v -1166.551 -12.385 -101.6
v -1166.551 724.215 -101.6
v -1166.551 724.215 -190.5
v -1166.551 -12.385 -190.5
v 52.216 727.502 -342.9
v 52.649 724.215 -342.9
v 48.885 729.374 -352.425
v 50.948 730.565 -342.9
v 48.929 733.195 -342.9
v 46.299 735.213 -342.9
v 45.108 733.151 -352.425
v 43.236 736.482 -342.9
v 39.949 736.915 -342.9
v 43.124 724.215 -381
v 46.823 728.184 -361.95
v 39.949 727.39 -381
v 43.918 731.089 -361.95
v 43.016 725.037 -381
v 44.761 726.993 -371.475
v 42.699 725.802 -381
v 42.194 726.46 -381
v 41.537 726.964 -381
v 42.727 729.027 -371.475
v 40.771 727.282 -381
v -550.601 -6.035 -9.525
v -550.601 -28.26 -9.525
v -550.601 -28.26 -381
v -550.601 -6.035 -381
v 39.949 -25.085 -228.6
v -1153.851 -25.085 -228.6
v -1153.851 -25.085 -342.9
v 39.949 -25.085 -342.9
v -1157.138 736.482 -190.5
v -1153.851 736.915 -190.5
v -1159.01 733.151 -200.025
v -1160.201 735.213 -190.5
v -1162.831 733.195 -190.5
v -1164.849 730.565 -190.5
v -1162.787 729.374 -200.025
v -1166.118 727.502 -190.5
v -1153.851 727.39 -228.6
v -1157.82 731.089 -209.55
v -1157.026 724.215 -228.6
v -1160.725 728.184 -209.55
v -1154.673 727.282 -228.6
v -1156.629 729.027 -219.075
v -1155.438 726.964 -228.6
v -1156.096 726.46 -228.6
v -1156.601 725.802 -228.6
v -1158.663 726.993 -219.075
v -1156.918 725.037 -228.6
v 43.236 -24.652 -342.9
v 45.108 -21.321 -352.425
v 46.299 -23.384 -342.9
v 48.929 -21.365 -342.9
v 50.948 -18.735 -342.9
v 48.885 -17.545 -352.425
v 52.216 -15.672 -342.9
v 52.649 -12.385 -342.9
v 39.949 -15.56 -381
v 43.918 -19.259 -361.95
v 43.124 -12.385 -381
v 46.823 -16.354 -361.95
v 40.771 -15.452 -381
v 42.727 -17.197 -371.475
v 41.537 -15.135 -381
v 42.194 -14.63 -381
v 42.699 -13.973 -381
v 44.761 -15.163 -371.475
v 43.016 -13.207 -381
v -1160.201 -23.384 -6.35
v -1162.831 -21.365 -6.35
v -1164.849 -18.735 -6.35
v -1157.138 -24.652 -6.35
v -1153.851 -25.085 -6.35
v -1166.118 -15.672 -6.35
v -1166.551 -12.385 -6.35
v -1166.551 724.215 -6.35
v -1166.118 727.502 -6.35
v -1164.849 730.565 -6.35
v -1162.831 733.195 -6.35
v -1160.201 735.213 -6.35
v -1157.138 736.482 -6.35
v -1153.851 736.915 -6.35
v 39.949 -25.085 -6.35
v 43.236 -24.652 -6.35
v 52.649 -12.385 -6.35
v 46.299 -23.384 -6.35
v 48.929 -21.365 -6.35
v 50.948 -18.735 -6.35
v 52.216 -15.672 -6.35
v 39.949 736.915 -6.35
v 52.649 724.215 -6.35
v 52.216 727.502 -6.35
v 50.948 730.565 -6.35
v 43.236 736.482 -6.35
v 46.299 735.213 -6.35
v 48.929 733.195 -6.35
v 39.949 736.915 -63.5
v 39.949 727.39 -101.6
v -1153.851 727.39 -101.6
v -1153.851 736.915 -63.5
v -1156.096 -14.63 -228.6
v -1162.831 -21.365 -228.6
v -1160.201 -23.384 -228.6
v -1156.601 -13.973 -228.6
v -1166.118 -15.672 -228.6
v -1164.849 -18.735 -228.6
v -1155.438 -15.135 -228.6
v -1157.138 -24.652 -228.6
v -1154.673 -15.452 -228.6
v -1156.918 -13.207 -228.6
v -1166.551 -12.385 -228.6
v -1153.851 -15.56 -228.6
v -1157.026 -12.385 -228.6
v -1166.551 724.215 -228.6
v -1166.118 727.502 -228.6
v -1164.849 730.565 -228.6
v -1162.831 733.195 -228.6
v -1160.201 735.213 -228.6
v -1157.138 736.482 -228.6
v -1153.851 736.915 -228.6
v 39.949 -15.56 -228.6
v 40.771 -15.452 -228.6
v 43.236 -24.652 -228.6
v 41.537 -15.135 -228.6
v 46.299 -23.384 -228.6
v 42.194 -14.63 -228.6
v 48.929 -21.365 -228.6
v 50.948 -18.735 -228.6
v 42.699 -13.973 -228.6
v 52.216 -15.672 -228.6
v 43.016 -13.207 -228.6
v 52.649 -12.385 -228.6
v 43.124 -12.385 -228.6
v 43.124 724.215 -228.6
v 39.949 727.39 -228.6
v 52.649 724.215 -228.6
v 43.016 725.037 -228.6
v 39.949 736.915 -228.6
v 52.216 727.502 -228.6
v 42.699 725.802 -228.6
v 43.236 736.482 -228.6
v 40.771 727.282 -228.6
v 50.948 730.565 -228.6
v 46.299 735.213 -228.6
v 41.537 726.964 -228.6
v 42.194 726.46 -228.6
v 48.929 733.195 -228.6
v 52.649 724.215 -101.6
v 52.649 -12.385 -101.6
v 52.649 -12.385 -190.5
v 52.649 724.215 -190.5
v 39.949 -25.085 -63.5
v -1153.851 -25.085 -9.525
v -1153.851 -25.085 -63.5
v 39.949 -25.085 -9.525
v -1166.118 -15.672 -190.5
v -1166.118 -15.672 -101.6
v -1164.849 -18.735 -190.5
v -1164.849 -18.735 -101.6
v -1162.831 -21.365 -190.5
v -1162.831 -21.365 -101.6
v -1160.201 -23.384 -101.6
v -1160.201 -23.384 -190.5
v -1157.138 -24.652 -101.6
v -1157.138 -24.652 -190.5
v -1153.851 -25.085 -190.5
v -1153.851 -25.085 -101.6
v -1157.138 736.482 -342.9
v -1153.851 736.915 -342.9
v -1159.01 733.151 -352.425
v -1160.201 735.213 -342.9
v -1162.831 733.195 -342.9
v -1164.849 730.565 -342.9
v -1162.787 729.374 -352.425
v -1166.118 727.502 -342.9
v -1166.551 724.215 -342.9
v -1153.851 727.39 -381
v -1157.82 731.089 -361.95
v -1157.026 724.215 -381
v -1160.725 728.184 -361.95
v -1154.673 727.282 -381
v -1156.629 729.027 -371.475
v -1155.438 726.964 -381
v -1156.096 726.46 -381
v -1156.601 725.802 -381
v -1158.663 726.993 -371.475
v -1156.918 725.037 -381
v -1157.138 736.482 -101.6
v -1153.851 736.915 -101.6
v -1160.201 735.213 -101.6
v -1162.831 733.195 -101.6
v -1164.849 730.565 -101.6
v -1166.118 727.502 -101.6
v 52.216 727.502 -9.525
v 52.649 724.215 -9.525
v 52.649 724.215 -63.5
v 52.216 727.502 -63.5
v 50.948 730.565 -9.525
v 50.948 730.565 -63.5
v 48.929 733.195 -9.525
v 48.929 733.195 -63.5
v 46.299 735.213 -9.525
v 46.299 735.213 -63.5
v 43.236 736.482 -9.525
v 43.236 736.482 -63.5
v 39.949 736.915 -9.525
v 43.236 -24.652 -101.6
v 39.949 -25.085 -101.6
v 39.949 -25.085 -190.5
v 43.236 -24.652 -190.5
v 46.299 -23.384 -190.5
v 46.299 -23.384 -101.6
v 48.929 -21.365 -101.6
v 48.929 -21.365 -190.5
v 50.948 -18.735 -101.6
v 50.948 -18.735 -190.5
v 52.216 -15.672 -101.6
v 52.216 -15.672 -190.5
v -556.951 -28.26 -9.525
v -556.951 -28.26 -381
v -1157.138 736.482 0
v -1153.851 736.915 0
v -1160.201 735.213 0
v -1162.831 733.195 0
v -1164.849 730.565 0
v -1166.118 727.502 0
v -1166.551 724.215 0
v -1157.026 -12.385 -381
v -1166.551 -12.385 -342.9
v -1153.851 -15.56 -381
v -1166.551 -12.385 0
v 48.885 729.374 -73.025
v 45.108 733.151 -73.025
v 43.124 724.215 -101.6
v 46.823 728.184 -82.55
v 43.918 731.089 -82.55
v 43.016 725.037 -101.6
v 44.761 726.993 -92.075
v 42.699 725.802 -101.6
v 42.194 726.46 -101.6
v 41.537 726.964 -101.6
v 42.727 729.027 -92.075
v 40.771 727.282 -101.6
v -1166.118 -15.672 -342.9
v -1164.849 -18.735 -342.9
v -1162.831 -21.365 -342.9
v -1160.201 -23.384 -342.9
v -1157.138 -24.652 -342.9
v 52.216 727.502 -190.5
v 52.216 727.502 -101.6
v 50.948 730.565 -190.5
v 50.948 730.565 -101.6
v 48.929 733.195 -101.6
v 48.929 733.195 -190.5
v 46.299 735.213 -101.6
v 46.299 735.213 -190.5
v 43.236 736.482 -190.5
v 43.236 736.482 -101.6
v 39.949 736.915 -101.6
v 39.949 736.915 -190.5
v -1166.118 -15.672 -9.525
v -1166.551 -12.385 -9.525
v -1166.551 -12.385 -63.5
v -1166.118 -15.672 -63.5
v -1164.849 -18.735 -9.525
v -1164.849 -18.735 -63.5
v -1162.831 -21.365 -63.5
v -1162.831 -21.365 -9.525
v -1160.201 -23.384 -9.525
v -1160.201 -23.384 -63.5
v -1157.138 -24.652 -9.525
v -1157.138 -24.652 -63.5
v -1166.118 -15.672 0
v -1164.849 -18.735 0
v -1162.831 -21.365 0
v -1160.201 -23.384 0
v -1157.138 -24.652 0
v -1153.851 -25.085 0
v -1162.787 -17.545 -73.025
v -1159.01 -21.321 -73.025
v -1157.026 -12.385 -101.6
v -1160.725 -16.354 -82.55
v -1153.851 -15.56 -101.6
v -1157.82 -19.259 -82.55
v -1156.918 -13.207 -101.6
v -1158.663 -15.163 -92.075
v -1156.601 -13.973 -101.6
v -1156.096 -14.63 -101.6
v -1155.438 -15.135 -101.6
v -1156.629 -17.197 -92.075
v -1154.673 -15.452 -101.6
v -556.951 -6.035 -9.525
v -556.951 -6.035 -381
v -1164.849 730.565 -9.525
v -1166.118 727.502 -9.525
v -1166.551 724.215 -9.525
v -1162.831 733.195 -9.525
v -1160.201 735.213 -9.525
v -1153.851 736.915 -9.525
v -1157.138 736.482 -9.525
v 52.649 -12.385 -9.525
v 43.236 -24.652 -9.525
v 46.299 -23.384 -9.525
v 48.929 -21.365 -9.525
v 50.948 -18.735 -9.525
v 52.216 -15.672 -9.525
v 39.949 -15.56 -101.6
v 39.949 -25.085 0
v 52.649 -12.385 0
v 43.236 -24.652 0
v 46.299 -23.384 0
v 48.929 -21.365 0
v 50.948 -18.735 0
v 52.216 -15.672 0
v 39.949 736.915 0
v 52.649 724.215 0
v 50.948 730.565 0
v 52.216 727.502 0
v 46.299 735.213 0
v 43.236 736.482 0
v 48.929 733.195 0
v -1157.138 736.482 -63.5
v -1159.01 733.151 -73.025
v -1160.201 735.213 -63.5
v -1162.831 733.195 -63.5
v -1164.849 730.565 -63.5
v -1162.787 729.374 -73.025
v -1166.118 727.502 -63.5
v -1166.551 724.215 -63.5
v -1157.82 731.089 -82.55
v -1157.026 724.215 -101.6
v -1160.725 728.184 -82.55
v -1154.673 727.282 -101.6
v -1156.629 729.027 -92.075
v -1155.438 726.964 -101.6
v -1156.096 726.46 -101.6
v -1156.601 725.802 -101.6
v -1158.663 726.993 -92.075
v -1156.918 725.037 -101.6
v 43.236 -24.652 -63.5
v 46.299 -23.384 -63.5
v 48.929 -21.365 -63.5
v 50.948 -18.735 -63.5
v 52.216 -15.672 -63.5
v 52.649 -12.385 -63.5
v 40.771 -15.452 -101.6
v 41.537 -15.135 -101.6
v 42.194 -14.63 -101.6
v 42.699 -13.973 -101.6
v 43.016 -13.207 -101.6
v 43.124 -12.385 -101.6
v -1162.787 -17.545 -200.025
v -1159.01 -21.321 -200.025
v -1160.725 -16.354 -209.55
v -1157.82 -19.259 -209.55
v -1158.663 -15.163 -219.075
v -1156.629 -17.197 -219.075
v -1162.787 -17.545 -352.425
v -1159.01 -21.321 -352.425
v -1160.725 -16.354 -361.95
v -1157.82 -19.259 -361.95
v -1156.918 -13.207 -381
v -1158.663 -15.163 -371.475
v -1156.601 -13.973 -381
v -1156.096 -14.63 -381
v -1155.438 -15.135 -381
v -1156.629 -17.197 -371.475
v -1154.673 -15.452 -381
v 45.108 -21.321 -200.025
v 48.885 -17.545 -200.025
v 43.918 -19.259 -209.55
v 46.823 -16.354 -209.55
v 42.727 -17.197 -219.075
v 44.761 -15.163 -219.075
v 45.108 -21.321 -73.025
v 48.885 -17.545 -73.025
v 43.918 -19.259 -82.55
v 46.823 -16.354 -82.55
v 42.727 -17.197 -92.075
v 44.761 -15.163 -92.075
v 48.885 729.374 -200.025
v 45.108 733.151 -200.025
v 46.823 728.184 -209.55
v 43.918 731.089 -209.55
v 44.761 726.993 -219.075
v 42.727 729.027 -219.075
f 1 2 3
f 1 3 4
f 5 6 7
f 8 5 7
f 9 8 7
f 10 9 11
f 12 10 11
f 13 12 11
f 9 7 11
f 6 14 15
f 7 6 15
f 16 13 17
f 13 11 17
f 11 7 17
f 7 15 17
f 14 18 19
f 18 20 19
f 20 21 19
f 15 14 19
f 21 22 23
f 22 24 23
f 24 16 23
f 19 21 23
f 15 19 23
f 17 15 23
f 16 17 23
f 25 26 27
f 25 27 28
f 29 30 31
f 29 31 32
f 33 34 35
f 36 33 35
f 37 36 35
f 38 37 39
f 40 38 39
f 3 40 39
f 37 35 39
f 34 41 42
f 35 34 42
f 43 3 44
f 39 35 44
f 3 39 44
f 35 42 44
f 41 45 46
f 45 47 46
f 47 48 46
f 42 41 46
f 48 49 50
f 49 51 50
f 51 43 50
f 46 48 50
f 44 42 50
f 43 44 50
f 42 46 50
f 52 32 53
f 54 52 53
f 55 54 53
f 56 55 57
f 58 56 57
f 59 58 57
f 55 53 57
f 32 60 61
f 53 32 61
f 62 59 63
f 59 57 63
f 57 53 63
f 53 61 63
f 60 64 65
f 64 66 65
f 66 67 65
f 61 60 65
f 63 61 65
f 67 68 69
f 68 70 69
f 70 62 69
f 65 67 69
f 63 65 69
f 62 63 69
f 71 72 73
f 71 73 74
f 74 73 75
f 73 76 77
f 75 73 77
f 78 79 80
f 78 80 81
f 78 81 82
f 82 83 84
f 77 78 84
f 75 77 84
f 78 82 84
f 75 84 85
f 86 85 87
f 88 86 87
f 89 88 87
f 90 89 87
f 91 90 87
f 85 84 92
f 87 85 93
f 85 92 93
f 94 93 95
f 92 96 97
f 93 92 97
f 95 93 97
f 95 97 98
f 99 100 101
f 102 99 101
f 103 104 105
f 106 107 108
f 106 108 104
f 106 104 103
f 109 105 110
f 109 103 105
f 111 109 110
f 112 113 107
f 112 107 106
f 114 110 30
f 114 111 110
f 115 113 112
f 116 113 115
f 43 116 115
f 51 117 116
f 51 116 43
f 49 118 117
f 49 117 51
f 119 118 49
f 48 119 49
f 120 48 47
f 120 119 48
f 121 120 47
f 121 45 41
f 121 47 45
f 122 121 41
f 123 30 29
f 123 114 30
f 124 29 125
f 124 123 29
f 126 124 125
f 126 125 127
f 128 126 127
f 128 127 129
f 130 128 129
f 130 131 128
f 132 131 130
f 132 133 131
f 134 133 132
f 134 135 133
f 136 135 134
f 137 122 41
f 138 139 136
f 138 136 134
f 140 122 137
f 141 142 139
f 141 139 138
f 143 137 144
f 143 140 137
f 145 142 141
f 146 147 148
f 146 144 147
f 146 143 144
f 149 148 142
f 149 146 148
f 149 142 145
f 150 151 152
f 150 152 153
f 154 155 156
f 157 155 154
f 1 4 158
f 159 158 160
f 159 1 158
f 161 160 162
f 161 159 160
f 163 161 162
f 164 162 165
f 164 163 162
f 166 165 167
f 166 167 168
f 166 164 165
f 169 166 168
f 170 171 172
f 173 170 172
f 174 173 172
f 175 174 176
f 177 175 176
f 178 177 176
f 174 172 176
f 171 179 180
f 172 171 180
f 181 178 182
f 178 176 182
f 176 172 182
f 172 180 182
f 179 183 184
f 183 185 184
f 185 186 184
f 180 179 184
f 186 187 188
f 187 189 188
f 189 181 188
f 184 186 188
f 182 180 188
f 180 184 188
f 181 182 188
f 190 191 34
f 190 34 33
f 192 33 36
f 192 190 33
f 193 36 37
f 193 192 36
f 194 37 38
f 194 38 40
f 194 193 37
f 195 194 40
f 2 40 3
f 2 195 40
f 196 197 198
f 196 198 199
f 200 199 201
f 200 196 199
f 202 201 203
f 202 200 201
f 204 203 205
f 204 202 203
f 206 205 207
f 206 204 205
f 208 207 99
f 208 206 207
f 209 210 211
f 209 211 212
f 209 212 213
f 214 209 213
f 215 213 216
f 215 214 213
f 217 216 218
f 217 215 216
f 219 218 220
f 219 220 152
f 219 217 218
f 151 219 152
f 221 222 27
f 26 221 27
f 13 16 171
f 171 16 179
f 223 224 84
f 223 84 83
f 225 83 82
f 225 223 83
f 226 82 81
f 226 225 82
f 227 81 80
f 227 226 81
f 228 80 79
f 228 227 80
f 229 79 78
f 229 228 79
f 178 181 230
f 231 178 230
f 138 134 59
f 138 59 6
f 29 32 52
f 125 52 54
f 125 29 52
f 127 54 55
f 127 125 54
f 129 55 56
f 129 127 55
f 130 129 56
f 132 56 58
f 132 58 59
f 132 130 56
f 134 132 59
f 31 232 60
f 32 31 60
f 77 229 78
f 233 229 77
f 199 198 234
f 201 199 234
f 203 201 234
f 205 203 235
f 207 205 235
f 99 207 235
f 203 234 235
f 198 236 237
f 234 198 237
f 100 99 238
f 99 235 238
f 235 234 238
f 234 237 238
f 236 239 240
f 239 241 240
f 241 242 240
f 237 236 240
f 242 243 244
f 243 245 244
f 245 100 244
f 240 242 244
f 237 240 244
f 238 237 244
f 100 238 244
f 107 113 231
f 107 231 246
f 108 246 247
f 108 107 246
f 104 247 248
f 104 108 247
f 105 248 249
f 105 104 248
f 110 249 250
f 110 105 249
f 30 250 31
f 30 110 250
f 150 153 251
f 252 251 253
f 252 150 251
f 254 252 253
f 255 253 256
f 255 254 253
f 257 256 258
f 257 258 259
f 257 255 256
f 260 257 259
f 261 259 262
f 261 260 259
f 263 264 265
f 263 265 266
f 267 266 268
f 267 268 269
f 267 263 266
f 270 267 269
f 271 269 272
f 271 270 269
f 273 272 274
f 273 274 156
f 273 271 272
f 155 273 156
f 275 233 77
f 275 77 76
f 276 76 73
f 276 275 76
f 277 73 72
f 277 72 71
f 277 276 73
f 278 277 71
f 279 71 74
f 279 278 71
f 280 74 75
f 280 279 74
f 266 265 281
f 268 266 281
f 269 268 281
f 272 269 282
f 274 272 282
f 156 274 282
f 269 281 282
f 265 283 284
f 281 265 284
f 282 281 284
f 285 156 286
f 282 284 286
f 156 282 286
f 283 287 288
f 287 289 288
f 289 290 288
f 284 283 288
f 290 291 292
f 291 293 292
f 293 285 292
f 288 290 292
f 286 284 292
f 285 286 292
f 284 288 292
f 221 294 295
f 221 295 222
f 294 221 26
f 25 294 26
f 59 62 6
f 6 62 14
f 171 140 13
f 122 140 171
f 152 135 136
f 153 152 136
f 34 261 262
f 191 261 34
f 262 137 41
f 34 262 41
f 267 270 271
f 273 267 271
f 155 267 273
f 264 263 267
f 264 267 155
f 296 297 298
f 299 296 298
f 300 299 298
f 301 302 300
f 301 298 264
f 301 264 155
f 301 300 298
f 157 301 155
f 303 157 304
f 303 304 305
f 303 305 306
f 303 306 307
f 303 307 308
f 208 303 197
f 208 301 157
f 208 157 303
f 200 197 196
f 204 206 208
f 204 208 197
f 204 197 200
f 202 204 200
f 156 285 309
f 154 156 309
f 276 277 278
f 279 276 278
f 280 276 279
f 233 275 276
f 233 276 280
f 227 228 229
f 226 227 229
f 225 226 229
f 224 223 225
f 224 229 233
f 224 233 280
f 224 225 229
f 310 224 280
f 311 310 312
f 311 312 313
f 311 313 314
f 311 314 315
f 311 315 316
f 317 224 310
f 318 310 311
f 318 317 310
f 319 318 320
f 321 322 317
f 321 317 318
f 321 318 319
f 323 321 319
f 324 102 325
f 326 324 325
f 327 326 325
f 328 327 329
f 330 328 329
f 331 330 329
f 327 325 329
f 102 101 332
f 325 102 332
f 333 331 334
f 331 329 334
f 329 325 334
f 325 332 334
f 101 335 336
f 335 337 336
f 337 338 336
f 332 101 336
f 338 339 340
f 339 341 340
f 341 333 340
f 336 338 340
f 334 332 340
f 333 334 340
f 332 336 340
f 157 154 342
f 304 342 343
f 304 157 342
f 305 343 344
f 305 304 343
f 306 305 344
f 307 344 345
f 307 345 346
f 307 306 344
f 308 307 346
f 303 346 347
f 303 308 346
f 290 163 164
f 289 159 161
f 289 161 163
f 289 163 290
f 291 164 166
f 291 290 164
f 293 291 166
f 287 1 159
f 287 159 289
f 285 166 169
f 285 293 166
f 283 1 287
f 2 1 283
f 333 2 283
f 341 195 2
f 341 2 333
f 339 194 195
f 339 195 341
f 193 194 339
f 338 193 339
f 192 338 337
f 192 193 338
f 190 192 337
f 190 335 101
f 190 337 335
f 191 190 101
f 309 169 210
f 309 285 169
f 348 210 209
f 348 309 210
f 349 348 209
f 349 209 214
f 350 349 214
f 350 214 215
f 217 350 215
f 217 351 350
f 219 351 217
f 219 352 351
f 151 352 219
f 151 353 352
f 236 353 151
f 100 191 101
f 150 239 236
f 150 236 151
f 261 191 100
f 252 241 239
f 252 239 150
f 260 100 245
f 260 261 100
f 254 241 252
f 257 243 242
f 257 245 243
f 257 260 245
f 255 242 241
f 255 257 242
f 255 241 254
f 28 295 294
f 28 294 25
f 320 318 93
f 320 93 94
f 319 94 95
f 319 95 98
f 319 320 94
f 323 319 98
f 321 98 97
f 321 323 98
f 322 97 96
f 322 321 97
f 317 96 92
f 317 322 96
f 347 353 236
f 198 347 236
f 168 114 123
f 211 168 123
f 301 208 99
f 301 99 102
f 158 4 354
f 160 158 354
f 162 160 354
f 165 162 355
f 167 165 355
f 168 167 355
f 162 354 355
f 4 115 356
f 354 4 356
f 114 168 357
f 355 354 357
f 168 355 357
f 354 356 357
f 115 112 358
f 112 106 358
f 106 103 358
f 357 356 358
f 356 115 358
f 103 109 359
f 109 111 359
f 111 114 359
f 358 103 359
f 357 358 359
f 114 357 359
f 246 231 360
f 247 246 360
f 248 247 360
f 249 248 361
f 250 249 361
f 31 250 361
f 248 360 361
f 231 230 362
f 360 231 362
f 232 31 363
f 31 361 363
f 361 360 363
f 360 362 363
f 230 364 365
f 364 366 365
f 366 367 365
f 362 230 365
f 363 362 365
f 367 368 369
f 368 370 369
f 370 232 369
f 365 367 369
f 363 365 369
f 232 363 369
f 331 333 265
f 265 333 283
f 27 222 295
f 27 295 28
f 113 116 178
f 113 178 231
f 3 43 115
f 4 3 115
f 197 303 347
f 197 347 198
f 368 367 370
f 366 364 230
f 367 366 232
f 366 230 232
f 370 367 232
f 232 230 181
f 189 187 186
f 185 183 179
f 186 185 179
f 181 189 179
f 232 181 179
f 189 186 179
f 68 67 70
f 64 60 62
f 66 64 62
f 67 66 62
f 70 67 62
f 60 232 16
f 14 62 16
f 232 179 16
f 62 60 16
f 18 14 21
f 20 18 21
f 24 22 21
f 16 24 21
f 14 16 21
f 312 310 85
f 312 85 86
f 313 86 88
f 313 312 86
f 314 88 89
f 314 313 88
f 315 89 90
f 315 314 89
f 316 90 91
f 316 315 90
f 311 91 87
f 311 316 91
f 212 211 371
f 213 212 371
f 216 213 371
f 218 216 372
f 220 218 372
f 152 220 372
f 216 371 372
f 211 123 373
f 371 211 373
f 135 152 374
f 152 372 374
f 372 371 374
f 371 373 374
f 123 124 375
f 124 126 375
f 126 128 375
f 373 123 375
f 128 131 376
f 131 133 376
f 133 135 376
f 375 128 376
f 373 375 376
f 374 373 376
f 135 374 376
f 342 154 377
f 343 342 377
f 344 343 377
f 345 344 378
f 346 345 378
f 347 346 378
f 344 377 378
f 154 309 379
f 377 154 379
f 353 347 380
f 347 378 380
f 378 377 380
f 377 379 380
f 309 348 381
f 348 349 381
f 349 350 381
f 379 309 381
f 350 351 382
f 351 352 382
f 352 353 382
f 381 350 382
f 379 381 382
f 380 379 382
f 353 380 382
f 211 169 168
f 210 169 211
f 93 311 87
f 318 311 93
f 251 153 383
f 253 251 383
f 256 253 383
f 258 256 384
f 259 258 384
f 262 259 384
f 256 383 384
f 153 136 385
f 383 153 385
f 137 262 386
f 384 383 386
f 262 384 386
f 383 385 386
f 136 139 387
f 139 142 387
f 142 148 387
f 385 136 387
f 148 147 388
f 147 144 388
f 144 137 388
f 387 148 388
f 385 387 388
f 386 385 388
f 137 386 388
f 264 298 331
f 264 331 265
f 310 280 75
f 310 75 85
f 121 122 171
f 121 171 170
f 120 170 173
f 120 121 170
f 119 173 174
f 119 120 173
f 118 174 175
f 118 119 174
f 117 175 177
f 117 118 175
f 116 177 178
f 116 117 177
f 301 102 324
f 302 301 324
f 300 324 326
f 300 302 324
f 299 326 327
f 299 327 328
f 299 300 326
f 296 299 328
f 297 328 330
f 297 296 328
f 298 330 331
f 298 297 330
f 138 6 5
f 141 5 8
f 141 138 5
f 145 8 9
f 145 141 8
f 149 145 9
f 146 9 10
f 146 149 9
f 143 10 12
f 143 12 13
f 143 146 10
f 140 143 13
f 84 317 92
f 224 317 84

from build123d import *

# Parameters (mm, degrees)
F1_DEPTH = 6.35
F2_START = -9.525
F2_DEPTH = 92.075
F3_SIZE2 = 9.525
F3_SIZE  = 38.1
F4_START = -101.6
F4_DEPTH = 127
F5_SIZE2 = 9.525
F5_SIZE  = 38.1
F6_START = -228.6
F6_DEPTH = 152.4
F7_SIZE2 = 9.525
F7_SIZE  = 38.1
F9_START = -9.525
F8_W     = 6.35
F8_H     = 3.175
F8_H_2   = 19.05
F9_DEPTH = 371.475


# Not quite as in the source:
# - a feature names something its author has since deleted; it is built from what else it names


with BuildPart() as f1:
    # F0 (on Top) → F1 (new body)
    with BuildSketch(Plane.XY):
        with BuildLine():
            Line((39.9490956545, 736.9148339033), (-1153.8509043455, 736.9148339033))
            ThreePointArc((-1153.8509043455, 736.9148339033), (-1162.8311604666, 733.1950900244), (-1166.5509043455, 724.2148339033))
            Line((-1166.5509043455, 724.2148339033), (-1166.5509043455, 40.0023339033))
            Line((-1166.5509043455, 40.0023339033), (-1166.5509043455, 38.4148339033))
            Line((-1166.5509043455, 38.4148339033), (-1147.5009043455, 38.4148339033))
            Line((-1147.5009043455, 38.4148339033), (-1103.0509043455, 38.4148339033))
            Line((-1103.0509043455, 38.4148339033), (-1103.0509043455, -6.0351660967))
            Line((-1103.0509043455, -6.0351660967), (-1103.0509043455, -25.0851660967))
            Line((-1103.0509043455, -25.0851660967), (-1101.4634043455, -25.0851660967))
            Line((-1101.4634043455, -25.0851660967), (-560.1259043455, -25.0851660967))
            Line((-560.1259043455, -25.0851660967), (-553.7759043455, -25.0851660967))
            Line((-553.7759043455, -25.0851660967), (39.9490956545, -25.0851660967))
            ThreePointArc((39.9490956545, -25.0851660967), (48.9293517756, -21.3654222178), (52.6490956545, -12.3851660967))
            Line((52.6490956545, -12.3851660967), (52.6490956545, 724.2148339033))
            ThreePointArc((52.6490956545, 724.2148339033), (48.9293517756, 733.1950900244), (39.9490956545, 736.9148339033))
        make_face()
        with BuildLine():
            Line((-1147.5009043455, 38.4148339033), (-1166.5509043455, 38.4148339033))
            Line((-1166.5509043455, 38.4148339033), (-1166.5509043455, -12.3851660967))
            ThreePointArc((-1166.5509043455, -12.3851660967), (-1162.8311604666, -21.3654222178), (-1153.8509043455, -25.0851660967))
            Line((-1153.8509043455, -25.0851660967), (-1103.0509043455, -25.0851660967))
            Line((-1103.0509043455, -25.0851660967), (-1103.0509043455, -6.0351660967))
            Line((-1103.0509043455, -6.0351660967), (-1103.0509043455, 38.4148339033))
            Line((-1103.0509043455, 38.4148339033), (-1147.5009043455, 38.4148339033))
        make_face()
    extrude(amount=-F1_DEPTH)


with BuildPart() as f2:
    # F0 (on Top) → F2 (new body)
    with BuildSketch(Plane.XY.offset(F2_START)):
        with BuildLine():
            Line((39.9490956545, 736.9148339033), (-1153.8509043455, 736.9148339033))
            ThreePointArc((-1153.8509043455, 736.9148339033), (-1162.8311604666, 733.1950900244), (-1166.5509043455, 724.2148339033))
            Line((-1166.5509043455, 724.2148339033), (-1166.5509043455, 40.0023339033))
            Line((-1166.5509043455, 40.0023339033), (-1166.5509043455, 38.4148339033))
            Line((-1166.5509043455, 38.4148339033), (-1147.5009043455, 38.4148339033))
            Line((-1147.5009043455, 38.4148339033), (-1103.0509043455, 38.4148339033))
            Line((-1103.0509043455, 38.4148339033), (-1103.0509043455, -6.0351660967))
            Line((-1103.0509043455, -6.0351660967), (-1103.0509043455, -25.0851660967))
            Line((-1103.0509043455, -25.0851660967), (-1101.4634043455, -25.0851660967))
            Line((-1101.4634043455, -25.0851660967), (-560.1259043455, -25.0851660967))
            Line((-560.1259043455, -25.0851660967), (-553.7759043455, -25.0851660967))
            Line((-553.7759043455, -25.0851660967), (39.9490956545, -25.0851660967))
            ThreePointArc((39.9490956545, -25.0851660967), (48.9293517756, -21.3654222178), (52.6490956545, -12.3851660967))
            Line((52.6490956545, -12.3851660967), (52.6490956545, 724.2148339033))
            ThreePointArc((52.6490956545, 724.2148339033), (48.9293517756, 733.1950900244), (39.9490956545, 736.9148339033))
        make_face()
        with BuildLine():
            Line((-1147.5009043455, 38.4148339033), (-1166.5509043455, 38.4148339033))
            Line((-1166.5509043455, 38.4148339033), (-1166.5509043455, -12.3851660967))
            ThreePointArc((-1166.5509043455, -12.3851660967), (-1162.8311604666, -21.3654222178), (-1153.8509043455, -25.0851660967))
            Line((-1153.8509043455, -25.0851660967), (-1103.0509043455, -25.0851660967))
            Line((-1103.0509043455, -25.0851660967), (-1103.0509043455, -6.0351660967))
            Line((-1103.0509043455, -6.0351660967), (-1103.0509043455, 38.4148339033))
            Line((-1103.0509043455, 38.4148339033), (-1147.5009043455, 38.4148339033))
        make_face()
    extrude(amount=-F2_DEPTH)

    # F3
    f3_edges = [f2.edges().sort_by_distance(p)[0] for p in [
        (-556.950904, 736.914834, -101.6),
        (-1162.83116, 733.19509, -101.6),
        (-1166.550904, 355.914834, -101.6),
        (-1162.83116, -21.365422, -101.6),
        (-556.950904, -25.085166, -101.6),
        (48.929352, -21.365422, -101.6),
        (52.649096, 355.914834, -101.6),
        (48.929352, 733.19509, -101.6),
    ]]
    chamfer(f3_edges, length=F3_SIZE, length2=F3_SIZE2)

    # F0 (on Top) → F4 (join)
    with BuildSketch(Plane.XY.offset(F4_START)):
        with BuildLine():
            Line((39.9490956545, 736.9148339033), (-1153.8509043455, 736.9148339033))
            ThreePointArc((-1153.8509043455, 736.9148339033), (-1162.8311604666, 733.1950900244), (-1166.5509043455, 724.2148339033))
            Line((-1166.5509043455, 724.2148339033), (-1166.5509043455, 40.0023339033))
            Line((-1166.5509043455, 40.0023339033), (-1166.5509043455, 38.4148339033))
            Line((-1166.5509043455, 38.4148339033), (-1147.5009043455, 38.4148339033))
            Line((-1147.5009043455, 38.4148339033), (-1103.0509043455, 38.4148339033))
            Line((-1103.0509043455, 38.4148339033), (-1103.0509043455, -6.0351660967))
            Line((-1103.0509043455, -6.0351660967), (-1103.0509043455, -25.0851660967))
            Line((-1103.0509043455, -25.0851660967), (-1101.4634043455, -25.0851660967))
            Line((-1101.4634043455, -25.0851660967), (-560.1259043455, -25.0851660967))
            Line((-560.1259043455, -25.0851660967), (-553.7759043455, -25.0851660967))
            Line((-553.7759043455, -25.0851660967), (39.9490956545, -25.0851660967))
            ThreePointArc((39.9490956545, -25.0851660967), (48.9293517756, -21.3654222178), (52.6490956545, -12.3851660967))
            Line((52.6490956545, -12.3851660967), (52.6490956545, 724.2148339033))
            ThreePointArc((52.6490956545, 724.2148339033), (48.9293517756, 733.1950900244), (39.9490956545, 736.9148339033))
        make_face()
        with BuildLine():
            Line((-1147.5009043455, 38.4148339033), (-1166.5509043455, 38.4148339033))
            Line((-1166.5509043455, 38.4148339033), (-1166.5509043455, -12.3851660967))
            ThreePointArc((-1166.5509043455, -12.3851660967), (-1162.8311604666, -21.3654222178), (-1153.8509043455, -25.0851660967))
            Line((-1153.8509043455, -25.0851660967), (-1103.0509043455, -25.0851660967))
            Line((-1103.0509043455, -25.0851660967), (-1103.0509043455, -6.0351660967))
            Line((-1103.0509043455, -6.0351660967), (-1103.0509043455, 38.4148339033))
            Line((-1103.0509043455, 38.4148339033), (-1147.5009043455, 38.4148339033))
        make_face()
    extrude(amount=-F4_DEPTH)

    # F5
    f5_edges = [f2.edges().sort_by_distance(p)[0] for p in [
        (-556.950904, 736.914834, -228.6),
        (-1162.83116, 733.19509, -228.6),
        (-1166.550904, 355.914834, -228.6),
        (-1162.83116, -21.365422, -228.6),
        (-556.950904, -25.085166, -228.6),
        (48.929352, -21.365422, -228.6),
        (52.649096, 355.914834, -228.6),
        (48.929352, 733.19509, -228.6),
    ]]
    chamfer(f5_edges, length=F5_SIZE, length2=F5_SIZE2)

    # F0 (on Top) → F6 (join)
    with BuildSketch(Plane.XY.offset(F6_START)):
        with BuildLine():
            Line((39.9490956545, 736.9148339033), (-1153.8509043455, 736.9148339033))
            ThreePointArc((-1153.8509043455, 736.9148339033), (-1162.8311604666, 733.1950900244), (-1166.5509043455, 724.2148339033))
            Line((-1166.5509043455, 724.2148339033), (-1166.5509043455, 40.0023339033))
            Line((-1166.5509043455, 40.0023339033), (-1166.5509043455, 38.4148339033))
            Line((-1166.5509043455, 38.4148339033), (-1147.5009043455, 38.4148339033))
            Line((-1147.5009043455, 38.4148339033), (-1103.0509043455, 38.4148339033))
            Line((-1103.0509043455, 38.4148339033), (-1103.0509043455, -6.0351660967))
            Line((-1103.0509043455, -6.0351660967), (-1103.0509043455, -25.0851660967))
            Line((-1103.0509043455, -25.0851660967), (-1101.4634043455, -25.0851660967))
            Line((-1101.4634043455, -25.0851660967), (-560.1259043455, -25.0851660967))
            Line((-560.1259043455, -25.0851660967), (-553.7759043455, -25.0851660967))
            Line((-553.7759043455, -25.0851660967), (39.9490956545, -25.0851660967))
            ThreePointArc((39.9490956545, -25.0851660967), (48.9293517756, -21.3654222178), (52.6490956545, -12.3851660967))
            Line((52.6490956545, -12.3851660967), (52.6490956545, 724.2148339033))
            ThreePointArc((52.6490956545, 724.2148339033), (48.9293517756, 733.1950900244), (39.9490956545, 736.9148339033))
        make_face()
        with BuildLine():
            Line((-1147.5009043455, 38.4148339033), (-1166.5509043455, 38.4148339033))
            Line((-1166.5509043455, 38.4148339033), (-1166.5509043455, -12.3851660967))
            ThreePointArc((-1166.5509043455, -12.3851660967), (-1162.8311604666, -21.3654222178), (-1153.8509043455, -25.0851660967))
            Line((-1153.8509043455, -25.0851660967), (-1103.0509043455, -25.0851660967))
            Line((-1103.0509043455, -25.0851660967), (-1103.0509043455, -6.0351660967))
            Line((-1103.0509043455, -6.0351660967), (-1103.0509043455, 38.4148339033))
            Line((-1103.0509043455, 38.4148339033), (-1147.5009043455, 38.4148339033))
        make_face()
    extrude(amount=-F6_DEPTH)

    # F7
    f7_edges = [f2.edges().sort_by_distance(p)[0] for p in [
        (-556.950904, 736.914834, -381),
        (-1162.83116, 733.19509, -381),
        (-1166.550904, 355.914834, -381),
        (-1162.83116, -21.365422, -381),
        (-556.950904, -25.085166, -381),
        (48.929352, -21.365422, -381),
        (52.649096, 355.914834, -381),
        (48.929352, 733.19509, -381),
    ]]
    chamfer(f7_edges, length=F7_SIZE, length2=F7_SIZE2)


with BuildPart() as f9:
    # F8 (on face) → F9 (new body)
    with BuildSketch(Plane.XY.offset(F9_START)):
        with Locations((-553.7759043455, -26.6726660967)):
            Rectangle(F8_W, F8_H)
        with Locations((-553.7759043455, -15.5601660967)):
            Rectangle(F8_W, F8_H_2)
    extrude(amount=-F9_DEPTH)


solid = Compound([f1.part, f2.part, f9.part])
